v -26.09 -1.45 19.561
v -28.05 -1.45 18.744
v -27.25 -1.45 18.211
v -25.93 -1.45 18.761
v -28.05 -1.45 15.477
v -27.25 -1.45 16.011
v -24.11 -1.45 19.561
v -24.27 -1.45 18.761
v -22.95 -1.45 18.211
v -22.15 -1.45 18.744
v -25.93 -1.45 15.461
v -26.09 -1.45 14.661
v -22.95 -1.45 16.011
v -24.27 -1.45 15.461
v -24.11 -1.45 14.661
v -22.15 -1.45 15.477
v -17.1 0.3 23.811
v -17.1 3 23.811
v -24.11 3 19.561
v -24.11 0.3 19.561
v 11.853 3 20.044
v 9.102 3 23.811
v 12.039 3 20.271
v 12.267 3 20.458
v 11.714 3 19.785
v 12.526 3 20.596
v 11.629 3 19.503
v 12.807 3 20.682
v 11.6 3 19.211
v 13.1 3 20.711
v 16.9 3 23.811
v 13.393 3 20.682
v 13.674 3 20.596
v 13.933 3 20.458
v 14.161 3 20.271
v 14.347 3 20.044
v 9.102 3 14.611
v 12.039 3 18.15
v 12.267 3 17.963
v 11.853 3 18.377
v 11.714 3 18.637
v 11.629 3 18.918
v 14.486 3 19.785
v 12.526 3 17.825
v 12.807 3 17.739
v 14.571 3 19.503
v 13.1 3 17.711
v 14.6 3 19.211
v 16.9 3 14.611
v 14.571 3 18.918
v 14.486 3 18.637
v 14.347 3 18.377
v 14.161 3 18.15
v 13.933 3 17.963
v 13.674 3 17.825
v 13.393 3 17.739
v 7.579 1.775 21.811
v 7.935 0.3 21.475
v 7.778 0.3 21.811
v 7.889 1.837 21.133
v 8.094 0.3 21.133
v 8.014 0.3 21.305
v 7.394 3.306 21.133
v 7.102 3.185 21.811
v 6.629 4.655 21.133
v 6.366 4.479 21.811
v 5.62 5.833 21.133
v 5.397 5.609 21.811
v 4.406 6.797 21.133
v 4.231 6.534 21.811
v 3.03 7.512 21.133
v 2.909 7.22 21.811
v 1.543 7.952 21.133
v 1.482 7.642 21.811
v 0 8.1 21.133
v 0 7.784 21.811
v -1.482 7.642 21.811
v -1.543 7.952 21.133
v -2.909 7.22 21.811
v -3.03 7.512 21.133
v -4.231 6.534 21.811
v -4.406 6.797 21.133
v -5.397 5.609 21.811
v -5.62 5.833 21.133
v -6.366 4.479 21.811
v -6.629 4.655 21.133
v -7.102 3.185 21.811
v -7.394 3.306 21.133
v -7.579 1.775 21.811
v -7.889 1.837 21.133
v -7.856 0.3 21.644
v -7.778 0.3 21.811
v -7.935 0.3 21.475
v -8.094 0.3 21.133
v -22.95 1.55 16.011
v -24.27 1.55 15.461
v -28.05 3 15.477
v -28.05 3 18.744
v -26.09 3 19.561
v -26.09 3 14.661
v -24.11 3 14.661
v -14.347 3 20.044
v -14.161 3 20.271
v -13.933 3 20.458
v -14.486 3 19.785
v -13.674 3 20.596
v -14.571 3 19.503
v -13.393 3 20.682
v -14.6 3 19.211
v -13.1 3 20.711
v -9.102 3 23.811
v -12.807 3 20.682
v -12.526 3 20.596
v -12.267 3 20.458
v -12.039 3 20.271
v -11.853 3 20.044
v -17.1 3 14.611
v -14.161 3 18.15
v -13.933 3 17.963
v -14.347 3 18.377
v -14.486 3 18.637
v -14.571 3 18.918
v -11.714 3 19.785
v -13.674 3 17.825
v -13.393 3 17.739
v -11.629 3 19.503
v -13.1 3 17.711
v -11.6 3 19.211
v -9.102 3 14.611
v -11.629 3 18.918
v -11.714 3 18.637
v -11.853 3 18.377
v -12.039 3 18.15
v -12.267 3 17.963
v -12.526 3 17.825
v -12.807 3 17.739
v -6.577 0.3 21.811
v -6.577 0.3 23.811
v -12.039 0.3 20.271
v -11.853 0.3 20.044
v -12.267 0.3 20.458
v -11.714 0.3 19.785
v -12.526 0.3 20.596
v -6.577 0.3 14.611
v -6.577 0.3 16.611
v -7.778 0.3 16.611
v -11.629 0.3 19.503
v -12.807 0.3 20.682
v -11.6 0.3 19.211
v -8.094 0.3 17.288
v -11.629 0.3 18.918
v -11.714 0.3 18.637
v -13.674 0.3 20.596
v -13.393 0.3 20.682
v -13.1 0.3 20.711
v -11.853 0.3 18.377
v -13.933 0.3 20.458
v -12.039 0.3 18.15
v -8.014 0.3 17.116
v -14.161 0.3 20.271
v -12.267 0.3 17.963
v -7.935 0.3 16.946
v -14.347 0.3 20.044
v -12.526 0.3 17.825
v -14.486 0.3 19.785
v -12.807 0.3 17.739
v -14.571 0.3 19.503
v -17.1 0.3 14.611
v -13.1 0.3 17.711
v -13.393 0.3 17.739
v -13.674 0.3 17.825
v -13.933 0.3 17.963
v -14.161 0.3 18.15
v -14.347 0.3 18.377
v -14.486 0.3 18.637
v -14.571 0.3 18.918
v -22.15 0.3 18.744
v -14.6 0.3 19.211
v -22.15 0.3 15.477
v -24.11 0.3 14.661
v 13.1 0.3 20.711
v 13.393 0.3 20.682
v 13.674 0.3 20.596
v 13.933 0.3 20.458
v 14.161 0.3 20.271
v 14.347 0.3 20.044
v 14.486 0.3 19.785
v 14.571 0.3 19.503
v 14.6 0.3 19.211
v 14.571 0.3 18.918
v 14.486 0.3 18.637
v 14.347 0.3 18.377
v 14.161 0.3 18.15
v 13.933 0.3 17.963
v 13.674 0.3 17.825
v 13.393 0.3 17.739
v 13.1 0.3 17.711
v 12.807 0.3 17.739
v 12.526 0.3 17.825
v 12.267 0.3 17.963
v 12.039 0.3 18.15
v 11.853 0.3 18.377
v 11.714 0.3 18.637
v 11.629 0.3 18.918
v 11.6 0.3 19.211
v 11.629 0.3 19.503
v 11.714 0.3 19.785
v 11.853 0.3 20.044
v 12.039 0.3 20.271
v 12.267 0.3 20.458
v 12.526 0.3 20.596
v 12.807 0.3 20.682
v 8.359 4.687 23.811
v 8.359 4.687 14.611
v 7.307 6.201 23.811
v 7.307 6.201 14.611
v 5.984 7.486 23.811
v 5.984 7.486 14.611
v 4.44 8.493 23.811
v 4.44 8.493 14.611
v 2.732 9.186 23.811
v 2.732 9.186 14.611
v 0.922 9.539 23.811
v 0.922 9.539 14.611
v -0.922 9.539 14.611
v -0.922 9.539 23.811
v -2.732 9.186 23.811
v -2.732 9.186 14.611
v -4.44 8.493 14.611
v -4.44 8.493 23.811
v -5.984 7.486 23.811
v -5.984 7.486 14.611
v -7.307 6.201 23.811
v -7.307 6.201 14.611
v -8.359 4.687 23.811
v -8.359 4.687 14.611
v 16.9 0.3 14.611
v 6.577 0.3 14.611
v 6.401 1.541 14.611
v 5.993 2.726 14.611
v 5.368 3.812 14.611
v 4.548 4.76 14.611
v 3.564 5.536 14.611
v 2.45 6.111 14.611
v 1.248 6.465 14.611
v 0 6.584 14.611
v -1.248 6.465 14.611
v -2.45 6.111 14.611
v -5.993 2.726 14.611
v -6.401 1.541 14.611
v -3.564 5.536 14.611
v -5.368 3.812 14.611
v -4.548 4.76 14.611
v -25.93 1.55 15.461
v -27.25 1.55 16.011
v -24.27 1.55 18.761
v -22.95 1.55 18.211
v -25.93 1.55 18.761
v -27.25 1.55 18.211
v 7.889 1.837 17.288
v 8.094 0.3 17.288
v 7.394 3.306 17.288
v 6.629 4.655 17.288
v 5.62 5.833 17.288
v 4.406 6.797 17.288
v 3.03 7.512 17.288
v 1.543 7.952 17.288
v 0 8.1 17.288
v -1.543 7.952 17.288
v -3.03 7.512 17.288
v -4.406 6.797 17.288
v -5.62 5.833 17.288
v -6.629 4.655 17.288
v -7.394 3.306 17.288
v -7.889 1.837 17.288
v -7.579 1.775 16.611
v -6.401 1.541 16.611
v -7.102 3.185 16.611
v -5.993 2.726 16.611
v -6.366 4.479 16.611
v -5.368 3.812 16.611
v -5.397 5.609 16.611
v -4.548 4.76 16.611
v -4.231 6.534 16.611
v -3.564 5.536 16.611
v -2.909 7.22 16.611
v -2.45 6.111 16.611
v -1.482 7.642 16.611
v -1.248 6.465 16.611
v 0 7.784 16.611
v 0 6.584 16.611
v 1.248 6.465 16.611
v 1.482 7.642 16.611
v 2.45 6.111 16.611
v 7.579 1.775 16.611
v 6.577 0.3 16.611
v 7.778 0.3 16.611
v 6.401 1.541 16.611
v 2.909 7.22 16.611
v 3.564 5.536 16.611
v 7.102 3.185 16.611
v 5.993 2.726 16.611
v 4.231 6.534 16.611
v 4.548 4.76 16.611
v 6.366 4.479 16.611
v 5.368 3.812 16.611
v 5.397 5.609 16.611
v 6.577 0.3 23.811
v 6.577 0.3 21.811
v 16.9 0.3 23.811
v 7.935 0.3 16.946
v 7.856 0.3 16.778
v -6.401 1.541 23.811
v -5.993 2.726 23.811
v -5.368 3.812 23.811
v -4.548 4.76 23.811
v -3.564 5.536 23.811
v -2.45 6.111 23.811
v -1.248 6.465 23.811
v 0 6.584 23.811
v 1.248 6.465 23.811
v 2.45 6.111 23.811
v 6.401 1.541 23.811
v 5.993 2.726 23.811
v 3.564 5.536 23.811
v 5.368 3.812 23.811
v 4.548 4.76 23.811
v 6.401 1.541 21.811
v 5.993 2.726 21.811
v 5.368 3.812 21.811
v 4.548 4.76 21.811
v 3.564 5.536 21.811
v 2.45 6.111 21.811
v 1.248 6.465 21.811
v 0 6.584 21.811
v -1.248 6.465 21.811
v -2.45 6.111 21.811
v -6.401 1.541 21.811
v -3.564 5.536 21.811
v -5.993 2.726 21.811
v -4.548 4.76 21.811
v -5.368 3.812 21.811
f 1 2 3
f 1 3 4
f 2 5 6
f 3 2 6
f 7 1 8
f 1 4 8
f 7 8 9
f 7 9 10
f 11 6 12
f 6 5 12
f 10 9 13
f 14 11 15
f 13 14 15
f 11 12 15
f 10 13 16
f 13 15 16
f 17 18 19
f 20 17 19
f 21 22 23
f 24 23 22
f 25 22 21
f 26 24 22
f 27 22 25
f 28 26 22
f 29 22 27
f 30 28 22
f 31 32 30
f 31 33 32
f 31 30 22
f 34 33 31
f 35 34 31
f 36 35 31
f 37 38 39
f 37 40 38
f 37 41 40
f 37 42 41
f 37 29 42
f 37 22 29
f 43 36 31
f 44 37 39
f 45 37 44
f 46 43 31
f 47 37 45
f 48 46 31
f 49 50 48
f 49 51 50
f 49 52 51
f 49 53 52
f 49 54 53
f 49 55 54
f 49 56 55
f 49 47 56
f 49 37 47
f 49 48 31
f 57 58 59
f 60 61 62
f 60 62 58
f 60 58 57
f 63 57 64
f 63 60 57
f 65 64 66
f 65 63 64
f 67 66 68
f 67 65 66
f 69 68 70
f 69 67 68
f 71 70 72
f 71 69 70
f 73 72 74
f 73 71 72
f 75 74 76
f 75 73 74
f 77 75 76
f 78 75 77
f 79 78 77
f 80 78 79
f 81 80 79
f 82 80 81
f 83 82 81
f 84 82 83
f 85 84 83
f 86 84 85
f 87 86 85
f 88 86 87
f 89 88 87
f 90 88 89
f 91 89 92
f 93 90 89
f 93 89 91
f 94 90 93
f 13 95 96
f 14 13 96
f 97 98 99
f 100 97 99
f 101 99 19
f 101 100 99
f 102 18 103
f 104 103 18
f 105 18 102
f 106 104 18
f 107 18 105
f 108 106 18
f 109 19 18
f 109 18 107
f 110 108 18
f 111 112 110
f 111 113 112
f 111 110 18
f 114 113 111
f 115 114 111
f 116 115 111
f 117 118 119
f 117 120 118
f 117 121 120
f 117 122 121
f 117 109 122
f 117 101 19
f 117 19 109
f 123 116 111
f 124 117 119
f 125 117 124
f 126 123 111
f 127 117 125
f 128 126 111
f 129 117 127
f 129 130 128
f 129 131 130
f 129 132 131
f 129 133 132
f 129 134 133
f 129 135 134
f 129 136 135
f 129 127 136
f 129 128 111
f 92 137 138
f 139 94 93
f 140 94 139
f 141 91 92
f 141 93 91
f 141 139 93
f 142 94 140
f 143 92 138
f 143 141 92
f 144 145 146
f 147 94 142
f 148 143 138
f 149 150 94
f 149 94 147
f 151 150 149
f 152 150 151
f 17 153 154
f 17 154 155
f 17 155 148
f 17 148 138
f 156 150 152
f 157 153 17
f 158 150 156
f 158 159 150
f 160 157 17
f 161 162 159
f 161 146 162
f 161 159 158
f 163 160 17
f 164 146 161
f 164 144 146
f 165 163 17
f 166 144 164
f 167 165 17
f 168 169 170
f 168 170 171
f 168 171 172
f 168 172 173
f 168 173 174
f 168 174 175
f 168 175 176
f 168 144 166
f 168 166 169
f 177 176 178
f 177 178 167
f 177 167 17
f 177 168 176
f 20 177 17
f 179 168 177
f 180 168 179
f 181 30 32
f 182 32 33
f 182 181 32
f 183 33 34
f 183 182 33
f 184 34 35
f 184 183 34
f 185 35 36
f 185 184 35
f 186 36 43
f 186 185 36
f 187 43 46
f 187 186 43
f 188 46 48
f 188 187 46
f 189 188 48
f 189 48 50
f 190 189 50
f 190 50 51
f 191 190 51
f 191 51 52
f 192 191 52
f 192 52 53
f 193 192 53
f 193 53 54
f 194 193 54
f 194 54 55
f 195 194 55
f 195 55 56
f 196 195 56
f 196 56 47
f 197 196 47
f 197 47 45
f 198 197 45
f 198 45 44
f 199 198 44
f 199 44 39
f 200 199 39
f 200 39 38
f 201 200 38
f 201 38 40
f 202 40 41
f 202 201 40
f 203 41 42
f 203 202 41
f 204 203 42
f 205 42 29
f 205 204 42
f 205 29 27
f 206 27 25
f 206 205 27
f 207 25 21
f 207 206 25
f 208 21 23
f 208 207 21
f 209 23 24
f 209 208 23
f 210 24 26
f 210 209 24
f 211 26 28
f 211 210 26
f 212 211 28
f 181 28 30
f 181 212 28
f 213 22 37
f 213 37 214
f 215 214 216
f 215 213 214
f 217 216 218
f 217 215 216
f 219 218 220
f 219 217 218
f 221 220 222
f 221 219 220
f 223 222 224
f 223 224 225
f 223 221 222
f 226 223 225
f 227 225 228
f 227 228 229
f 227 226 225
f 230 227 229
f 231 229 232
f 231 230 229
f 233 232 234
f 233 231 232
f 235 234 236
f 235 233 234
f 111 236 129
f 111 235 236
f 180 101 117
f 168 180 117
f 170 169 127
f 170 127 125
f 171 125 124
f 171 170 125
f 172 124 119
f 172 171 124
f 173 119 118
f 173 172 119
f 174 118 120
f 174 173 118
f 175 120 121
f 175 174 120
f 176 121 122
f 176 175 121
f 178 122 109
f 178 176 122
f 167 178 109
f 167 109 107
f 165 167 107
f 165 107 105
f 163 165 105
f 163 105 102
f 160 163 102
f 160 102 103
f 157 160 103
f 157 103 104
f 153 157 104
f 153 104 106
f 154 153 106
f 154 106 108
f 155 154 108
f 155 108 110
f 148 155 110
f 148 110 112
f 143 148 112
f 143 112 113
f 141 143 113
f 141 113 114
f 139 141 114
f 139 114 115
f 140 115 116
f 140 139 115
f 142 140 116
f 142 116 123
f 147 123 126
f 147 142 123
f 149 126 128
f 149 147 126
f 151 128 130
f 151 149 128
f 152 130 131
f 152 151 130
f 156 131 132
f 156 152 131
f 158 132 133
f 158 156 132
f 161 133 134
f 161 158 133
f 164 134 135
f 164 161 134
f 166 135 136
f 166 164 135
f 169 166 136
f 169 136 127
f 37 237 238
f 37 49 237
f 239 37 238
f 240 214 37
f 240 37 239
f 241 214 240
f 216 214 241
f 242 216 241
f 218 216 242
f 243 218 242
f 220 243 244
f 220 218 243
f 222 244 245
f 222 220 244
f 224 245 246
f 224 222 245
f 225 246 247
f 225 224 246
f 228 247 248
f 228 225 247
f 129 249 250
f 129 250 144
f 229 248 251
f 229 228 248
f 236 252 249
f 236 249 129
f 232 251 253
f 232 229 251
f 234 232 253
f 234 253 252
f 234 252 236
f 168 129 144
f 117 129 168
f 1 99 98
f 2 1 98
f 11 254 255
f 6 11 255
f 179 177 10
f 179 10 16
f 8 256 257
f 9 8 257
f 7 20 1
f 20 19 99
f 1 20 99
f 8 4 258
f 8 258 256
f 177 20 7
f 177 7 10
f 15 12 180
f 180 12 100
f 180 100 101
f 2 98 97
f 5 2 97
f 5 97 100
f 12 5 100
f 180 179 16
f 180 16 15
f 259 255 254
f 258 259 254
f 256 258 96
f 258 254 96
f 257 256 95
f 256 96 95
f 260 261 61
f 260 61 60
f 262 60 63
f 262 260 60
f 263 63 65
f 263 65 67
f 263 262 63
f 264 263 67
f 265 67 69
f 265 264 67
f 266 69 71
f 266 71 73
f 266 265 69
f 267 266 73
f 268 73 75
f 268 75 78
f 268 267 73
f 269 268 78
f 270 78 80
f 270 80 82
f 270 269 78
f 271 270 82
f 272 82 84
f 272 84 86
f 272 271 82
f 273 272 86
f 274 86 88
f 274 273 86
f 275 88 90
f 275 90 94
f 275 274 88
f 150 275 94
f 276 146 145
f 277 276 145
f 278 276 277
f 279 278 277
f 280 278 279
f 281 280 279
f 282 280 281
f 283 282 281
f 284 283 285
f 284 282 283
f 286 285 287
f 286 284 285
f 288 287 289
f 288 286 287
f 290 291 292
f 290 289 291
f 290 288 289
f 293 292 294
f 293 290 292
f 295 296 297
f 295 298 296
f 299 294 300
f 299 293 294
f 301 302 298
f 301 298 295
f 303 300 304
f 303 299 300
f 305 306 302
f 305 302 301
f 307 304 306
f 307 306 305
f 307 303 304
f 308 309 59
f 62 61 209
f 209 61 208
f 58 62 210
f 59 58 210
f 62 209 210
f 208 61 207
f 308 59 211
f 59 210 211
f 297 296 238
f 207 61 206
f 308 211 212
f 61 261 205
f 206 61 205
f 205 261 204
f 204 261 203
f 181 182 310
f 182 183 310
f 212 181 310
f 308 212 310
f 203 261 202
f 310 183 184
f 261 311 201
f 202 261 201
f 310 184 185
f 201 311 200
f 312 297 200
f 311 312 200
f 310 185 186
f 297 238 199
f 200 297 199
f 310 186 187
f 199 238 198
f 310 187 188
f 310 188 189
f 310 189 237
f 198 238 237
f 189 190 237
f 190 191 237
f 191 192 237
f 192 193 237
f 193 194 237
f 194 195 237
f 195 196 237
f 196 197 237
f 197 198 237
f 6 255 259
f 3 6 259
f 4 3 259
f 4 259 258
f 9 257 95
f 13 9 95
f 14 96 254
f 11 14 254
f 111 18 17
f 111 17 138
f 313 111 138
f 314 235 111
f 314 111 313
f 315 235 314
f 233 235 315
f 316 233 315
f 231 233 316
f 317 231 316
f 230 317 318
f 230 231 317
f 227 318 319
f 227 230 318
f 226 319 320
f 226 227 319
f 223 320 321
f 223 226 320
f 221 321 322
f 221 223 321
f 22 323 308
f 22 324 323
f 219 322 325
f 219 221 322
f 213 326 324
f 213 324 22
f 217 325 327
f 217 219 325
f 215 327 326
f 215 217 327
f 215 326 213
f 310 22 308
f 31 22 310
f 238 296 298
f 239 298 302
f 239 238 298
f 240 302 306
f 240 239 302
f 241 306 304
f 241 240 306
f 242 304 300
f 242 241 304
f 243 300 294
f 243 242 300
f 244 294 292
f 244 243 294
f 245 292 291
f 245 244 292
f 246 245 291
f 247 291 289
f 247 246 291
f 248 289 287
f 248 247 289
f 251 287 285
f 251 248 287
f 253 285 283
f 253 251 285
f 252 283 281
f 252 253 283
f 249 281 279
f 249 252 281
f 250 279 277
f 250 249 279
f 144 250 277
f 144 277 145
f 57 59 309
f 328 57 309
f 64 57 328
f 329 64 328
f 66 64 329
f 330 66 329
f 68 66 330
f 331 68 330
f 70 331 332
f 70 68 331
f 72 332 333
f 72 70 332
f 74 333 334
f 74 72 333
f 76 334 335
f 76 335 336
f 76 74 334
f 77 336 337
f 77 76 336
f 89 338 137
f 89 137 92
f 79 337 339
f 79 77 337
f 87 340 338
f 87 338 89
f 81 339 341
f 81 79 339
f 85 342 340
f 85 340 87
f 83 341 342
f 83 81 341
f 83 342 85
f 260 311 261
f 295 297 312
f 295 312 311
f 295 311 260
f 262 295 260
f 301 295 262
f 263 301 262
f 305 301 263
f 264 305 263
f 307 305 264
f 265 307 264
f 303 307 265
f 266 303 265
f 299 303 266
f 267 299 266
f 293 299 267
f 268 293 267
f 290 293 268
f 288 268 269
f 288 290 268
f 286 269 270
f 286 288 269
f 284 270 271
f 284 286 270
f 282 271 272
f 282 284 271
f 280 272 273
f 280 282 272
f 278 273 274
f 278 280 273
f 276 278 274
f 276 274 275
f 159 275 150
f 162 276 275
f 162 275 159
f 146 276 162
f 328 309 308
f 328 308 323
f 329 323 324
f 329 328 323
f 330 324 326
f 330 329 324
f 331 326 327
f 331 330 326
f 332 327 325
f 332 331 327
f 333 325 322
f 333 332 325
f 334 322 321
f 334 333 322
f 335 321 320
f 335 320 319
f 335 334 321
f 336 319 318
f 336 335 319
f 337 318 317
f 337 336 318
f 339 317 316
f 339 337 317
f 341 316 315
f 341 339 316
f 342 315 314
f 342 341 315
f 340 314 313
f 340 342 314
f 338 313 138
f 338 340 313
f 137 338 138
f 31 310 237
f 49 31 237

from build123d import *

# Parameters (mm, degrees)
REVOLVE_1_ANGLE       = 180
SKETCH_3_W            = 9
SKETCH_3_H            = 9.2
SKETCH_3_R            = 1.5
EXTRUDE_2_DEPTH       = 3
MOVE_FACE_1_OUTLINE_W = 34.2
MOVE_FACE_1_OUTLINE_H = 9.2
MOVE_FACE_1_OUTLINE_R = 1.5
MOVE_FACE_1_DEPTH     = 0.3
EXTRUDE_3_DEPTH       = 2.7
EXTRUDE_4_DEPTH       = 4.45
EXTRUDE_5_DEPTH       = 1.45
MOVE_FACE_2_BY        = 0.2


# Read off the part's stored shape, not the designer's step: Переместить грань1
with BuildPart() as part:
    # Эскиз2 → Повернуть1 (revolve)
    with BuildSketch(Plane(origin=(0, 0, 0), x_dir=(1, 0, 0), z_dir=(0, 1, 0))):
        Polygon((6.583922431, -16.610594473), (6.583922431, -14.610594473), (9.583922431, -14.610594473), (9.583922431, -23.810594473), (6.583922431, -23.810594473), (6.583922431, -21.810594473), (7.783922431, -21.810594473), (8.1, -21.132763939), (8.1, -17.288425007), (7.783922431, -16.610594473), align=None)
    revolve(axis=Axis((0, 0, 1.686216313), (0, 0, 1)), revolution_arc=REVOLVE_1_ANGLE)

    # Эскиз3 → Бобышка-Вытянуть2 (add)
    # profile 1 of 2: a face of its own
    with BuildSketch(Plane(origin=(0, 0, 0), x_dir=(1, 0, 0), z_dir=(0, 1, 0))):
        with Locations((12.6, -19.210594473)):
            Rectangle(SKETCH_3_W, SKETCH_3_H)
        with Locations(Location((13.1, -19.210594473, 0), (0, 0, 270))):
            Circle(SKETCH_3_R, mode=Mode.SUBTRACT)
    # profile 2 of 2: a face of its own
    with BuildSketch(Plane(origin=(0, 0, 0), x_dir=(1, 0, 0), z_dir=(0, 1, 0))):
        with Locations((-12.6, -19.210594473)):
            Rectangle(SKETCH_3_W, SKETCH_3_H)
        with Locations(Location((-13.1, -19.210594473, 0), (0, 0, 90))):
            Circle(SKETCH_3_R, mode=Mode.SUBTRACT)
    extrude(amount=EXTRUDE_2_DEPTH)

    # Move Face 1 outline → Move Face 1 (cut)
    with BuildSketch(Plane(origin=(0, 0, 0), x_dir=(1, 0, 0), z_dir=(0, 1, 0))):
        with Locations((0, -19.210594473)):
            Rectangle(MOVE_FACE_1_OUTLINE_W, MOVE_FACE_1_OUTLINE_H)
        with Locations((-13.1, -19.210594473)):
            Circle(MOVE_FACE_1_OUTLINE_R, mode=Mode.SUBTRACT)
        with Locations((13.1, -19.210594473)):
            Circle(MOVE_FACE_1_OUTLINE_R, mode=Mode.SUBTRACT)
    extrude(amount=MOVE_FACE_1_DEPTH, mode=Mode.SUBTRACT)

    # Эскиз4 → Бобышка-Вытянуть3 (add)
    with BuildSketch(Plane(origin=(0, 3, 0), x_dir=(1, 0, 0), z_dir=(0, 1, 0))):
        Polygon((-24.11, -14.660594473), (-17.1, -14.610594473), (-17.1, -23.810594473), (-24.11, -19.560594473), (-26.09, -19.560594473), (-28.05, -18.743927806), (-28.05, -15.47726114), (-26.09, -14.660594473), align=None)
        Polygon((-27.25, -16.010594473), (-27.25, -18.210594473), (-25.93, -18.760594473), (-24.27, -18.760594473), (-22.95, -18.210594473), (-22.95, -16.010594473), (-24.27, -15.460594473), (-25.93, -15.460594473), align=None, mode=Mode.SUBTRACT)
    extrude(amount=-EXTRUDE_3_DEPTH)

    # Эскиз5 → Бобышка-Вытянуть4 (add)
    with BuildSketch(Plane(origin=(0, 3, 0), x_dir=(1, 0, 0), z_dir=(0, 1, 0))):
        Polygon((-28.05, -15.47726114), (-28.05, -18.743927806), (-26.09, -19.560594473), (-24.11, -19.560594473), (-22.15, -18.743927806), (-22.15, -15.47726114), (-24.11, -14.660594473), (-26.09, -14.660594473), align=None)
        Polygon((-27.25, -16.010594473), (-27.25, -18.210594473), (-25.93, -18.760594473), (-24.27, -18.760594473), (-22.95, -18.210594473), (-22.95, -16.010594473), (-24.27, -15.460594473), (-25.93, -15.460594473), align=None, mode=Mode.SUBTRACT)
    extrude(amount=-EXTRUDE_4_DEPTH)

    # Эскиз5<2> → Бобышка-Вытянуть5 (add)
    with BuildSketch(Plane(origin=(0, 3, 0), x_dir=(1, 0, 0), z_dir=(0, 1, 0))):
        Polygon((-25.93, -15.460594473), (-27.25, -16.010594473), (-27.25, -18.210594473), (-25.93, -18.760594473), (-24.27, -18.760594473), (-22.95, -18.210594473), (-22.95, -16.010594473), (-24.27, -15.460594473), align=None)
    extrude(amount=-EXTRUDE_5_DEPTH)

    # Move Face 2: a face moved inward by 0.2
    extrude(part.faces().sort_by_distance((17.1, 1.65, 19.210594473))[0], amount=MOVE_FACE_2_BY, dir=(-1, 0, 0), mode=Mode.SUBTRACT)


solid = part.part
